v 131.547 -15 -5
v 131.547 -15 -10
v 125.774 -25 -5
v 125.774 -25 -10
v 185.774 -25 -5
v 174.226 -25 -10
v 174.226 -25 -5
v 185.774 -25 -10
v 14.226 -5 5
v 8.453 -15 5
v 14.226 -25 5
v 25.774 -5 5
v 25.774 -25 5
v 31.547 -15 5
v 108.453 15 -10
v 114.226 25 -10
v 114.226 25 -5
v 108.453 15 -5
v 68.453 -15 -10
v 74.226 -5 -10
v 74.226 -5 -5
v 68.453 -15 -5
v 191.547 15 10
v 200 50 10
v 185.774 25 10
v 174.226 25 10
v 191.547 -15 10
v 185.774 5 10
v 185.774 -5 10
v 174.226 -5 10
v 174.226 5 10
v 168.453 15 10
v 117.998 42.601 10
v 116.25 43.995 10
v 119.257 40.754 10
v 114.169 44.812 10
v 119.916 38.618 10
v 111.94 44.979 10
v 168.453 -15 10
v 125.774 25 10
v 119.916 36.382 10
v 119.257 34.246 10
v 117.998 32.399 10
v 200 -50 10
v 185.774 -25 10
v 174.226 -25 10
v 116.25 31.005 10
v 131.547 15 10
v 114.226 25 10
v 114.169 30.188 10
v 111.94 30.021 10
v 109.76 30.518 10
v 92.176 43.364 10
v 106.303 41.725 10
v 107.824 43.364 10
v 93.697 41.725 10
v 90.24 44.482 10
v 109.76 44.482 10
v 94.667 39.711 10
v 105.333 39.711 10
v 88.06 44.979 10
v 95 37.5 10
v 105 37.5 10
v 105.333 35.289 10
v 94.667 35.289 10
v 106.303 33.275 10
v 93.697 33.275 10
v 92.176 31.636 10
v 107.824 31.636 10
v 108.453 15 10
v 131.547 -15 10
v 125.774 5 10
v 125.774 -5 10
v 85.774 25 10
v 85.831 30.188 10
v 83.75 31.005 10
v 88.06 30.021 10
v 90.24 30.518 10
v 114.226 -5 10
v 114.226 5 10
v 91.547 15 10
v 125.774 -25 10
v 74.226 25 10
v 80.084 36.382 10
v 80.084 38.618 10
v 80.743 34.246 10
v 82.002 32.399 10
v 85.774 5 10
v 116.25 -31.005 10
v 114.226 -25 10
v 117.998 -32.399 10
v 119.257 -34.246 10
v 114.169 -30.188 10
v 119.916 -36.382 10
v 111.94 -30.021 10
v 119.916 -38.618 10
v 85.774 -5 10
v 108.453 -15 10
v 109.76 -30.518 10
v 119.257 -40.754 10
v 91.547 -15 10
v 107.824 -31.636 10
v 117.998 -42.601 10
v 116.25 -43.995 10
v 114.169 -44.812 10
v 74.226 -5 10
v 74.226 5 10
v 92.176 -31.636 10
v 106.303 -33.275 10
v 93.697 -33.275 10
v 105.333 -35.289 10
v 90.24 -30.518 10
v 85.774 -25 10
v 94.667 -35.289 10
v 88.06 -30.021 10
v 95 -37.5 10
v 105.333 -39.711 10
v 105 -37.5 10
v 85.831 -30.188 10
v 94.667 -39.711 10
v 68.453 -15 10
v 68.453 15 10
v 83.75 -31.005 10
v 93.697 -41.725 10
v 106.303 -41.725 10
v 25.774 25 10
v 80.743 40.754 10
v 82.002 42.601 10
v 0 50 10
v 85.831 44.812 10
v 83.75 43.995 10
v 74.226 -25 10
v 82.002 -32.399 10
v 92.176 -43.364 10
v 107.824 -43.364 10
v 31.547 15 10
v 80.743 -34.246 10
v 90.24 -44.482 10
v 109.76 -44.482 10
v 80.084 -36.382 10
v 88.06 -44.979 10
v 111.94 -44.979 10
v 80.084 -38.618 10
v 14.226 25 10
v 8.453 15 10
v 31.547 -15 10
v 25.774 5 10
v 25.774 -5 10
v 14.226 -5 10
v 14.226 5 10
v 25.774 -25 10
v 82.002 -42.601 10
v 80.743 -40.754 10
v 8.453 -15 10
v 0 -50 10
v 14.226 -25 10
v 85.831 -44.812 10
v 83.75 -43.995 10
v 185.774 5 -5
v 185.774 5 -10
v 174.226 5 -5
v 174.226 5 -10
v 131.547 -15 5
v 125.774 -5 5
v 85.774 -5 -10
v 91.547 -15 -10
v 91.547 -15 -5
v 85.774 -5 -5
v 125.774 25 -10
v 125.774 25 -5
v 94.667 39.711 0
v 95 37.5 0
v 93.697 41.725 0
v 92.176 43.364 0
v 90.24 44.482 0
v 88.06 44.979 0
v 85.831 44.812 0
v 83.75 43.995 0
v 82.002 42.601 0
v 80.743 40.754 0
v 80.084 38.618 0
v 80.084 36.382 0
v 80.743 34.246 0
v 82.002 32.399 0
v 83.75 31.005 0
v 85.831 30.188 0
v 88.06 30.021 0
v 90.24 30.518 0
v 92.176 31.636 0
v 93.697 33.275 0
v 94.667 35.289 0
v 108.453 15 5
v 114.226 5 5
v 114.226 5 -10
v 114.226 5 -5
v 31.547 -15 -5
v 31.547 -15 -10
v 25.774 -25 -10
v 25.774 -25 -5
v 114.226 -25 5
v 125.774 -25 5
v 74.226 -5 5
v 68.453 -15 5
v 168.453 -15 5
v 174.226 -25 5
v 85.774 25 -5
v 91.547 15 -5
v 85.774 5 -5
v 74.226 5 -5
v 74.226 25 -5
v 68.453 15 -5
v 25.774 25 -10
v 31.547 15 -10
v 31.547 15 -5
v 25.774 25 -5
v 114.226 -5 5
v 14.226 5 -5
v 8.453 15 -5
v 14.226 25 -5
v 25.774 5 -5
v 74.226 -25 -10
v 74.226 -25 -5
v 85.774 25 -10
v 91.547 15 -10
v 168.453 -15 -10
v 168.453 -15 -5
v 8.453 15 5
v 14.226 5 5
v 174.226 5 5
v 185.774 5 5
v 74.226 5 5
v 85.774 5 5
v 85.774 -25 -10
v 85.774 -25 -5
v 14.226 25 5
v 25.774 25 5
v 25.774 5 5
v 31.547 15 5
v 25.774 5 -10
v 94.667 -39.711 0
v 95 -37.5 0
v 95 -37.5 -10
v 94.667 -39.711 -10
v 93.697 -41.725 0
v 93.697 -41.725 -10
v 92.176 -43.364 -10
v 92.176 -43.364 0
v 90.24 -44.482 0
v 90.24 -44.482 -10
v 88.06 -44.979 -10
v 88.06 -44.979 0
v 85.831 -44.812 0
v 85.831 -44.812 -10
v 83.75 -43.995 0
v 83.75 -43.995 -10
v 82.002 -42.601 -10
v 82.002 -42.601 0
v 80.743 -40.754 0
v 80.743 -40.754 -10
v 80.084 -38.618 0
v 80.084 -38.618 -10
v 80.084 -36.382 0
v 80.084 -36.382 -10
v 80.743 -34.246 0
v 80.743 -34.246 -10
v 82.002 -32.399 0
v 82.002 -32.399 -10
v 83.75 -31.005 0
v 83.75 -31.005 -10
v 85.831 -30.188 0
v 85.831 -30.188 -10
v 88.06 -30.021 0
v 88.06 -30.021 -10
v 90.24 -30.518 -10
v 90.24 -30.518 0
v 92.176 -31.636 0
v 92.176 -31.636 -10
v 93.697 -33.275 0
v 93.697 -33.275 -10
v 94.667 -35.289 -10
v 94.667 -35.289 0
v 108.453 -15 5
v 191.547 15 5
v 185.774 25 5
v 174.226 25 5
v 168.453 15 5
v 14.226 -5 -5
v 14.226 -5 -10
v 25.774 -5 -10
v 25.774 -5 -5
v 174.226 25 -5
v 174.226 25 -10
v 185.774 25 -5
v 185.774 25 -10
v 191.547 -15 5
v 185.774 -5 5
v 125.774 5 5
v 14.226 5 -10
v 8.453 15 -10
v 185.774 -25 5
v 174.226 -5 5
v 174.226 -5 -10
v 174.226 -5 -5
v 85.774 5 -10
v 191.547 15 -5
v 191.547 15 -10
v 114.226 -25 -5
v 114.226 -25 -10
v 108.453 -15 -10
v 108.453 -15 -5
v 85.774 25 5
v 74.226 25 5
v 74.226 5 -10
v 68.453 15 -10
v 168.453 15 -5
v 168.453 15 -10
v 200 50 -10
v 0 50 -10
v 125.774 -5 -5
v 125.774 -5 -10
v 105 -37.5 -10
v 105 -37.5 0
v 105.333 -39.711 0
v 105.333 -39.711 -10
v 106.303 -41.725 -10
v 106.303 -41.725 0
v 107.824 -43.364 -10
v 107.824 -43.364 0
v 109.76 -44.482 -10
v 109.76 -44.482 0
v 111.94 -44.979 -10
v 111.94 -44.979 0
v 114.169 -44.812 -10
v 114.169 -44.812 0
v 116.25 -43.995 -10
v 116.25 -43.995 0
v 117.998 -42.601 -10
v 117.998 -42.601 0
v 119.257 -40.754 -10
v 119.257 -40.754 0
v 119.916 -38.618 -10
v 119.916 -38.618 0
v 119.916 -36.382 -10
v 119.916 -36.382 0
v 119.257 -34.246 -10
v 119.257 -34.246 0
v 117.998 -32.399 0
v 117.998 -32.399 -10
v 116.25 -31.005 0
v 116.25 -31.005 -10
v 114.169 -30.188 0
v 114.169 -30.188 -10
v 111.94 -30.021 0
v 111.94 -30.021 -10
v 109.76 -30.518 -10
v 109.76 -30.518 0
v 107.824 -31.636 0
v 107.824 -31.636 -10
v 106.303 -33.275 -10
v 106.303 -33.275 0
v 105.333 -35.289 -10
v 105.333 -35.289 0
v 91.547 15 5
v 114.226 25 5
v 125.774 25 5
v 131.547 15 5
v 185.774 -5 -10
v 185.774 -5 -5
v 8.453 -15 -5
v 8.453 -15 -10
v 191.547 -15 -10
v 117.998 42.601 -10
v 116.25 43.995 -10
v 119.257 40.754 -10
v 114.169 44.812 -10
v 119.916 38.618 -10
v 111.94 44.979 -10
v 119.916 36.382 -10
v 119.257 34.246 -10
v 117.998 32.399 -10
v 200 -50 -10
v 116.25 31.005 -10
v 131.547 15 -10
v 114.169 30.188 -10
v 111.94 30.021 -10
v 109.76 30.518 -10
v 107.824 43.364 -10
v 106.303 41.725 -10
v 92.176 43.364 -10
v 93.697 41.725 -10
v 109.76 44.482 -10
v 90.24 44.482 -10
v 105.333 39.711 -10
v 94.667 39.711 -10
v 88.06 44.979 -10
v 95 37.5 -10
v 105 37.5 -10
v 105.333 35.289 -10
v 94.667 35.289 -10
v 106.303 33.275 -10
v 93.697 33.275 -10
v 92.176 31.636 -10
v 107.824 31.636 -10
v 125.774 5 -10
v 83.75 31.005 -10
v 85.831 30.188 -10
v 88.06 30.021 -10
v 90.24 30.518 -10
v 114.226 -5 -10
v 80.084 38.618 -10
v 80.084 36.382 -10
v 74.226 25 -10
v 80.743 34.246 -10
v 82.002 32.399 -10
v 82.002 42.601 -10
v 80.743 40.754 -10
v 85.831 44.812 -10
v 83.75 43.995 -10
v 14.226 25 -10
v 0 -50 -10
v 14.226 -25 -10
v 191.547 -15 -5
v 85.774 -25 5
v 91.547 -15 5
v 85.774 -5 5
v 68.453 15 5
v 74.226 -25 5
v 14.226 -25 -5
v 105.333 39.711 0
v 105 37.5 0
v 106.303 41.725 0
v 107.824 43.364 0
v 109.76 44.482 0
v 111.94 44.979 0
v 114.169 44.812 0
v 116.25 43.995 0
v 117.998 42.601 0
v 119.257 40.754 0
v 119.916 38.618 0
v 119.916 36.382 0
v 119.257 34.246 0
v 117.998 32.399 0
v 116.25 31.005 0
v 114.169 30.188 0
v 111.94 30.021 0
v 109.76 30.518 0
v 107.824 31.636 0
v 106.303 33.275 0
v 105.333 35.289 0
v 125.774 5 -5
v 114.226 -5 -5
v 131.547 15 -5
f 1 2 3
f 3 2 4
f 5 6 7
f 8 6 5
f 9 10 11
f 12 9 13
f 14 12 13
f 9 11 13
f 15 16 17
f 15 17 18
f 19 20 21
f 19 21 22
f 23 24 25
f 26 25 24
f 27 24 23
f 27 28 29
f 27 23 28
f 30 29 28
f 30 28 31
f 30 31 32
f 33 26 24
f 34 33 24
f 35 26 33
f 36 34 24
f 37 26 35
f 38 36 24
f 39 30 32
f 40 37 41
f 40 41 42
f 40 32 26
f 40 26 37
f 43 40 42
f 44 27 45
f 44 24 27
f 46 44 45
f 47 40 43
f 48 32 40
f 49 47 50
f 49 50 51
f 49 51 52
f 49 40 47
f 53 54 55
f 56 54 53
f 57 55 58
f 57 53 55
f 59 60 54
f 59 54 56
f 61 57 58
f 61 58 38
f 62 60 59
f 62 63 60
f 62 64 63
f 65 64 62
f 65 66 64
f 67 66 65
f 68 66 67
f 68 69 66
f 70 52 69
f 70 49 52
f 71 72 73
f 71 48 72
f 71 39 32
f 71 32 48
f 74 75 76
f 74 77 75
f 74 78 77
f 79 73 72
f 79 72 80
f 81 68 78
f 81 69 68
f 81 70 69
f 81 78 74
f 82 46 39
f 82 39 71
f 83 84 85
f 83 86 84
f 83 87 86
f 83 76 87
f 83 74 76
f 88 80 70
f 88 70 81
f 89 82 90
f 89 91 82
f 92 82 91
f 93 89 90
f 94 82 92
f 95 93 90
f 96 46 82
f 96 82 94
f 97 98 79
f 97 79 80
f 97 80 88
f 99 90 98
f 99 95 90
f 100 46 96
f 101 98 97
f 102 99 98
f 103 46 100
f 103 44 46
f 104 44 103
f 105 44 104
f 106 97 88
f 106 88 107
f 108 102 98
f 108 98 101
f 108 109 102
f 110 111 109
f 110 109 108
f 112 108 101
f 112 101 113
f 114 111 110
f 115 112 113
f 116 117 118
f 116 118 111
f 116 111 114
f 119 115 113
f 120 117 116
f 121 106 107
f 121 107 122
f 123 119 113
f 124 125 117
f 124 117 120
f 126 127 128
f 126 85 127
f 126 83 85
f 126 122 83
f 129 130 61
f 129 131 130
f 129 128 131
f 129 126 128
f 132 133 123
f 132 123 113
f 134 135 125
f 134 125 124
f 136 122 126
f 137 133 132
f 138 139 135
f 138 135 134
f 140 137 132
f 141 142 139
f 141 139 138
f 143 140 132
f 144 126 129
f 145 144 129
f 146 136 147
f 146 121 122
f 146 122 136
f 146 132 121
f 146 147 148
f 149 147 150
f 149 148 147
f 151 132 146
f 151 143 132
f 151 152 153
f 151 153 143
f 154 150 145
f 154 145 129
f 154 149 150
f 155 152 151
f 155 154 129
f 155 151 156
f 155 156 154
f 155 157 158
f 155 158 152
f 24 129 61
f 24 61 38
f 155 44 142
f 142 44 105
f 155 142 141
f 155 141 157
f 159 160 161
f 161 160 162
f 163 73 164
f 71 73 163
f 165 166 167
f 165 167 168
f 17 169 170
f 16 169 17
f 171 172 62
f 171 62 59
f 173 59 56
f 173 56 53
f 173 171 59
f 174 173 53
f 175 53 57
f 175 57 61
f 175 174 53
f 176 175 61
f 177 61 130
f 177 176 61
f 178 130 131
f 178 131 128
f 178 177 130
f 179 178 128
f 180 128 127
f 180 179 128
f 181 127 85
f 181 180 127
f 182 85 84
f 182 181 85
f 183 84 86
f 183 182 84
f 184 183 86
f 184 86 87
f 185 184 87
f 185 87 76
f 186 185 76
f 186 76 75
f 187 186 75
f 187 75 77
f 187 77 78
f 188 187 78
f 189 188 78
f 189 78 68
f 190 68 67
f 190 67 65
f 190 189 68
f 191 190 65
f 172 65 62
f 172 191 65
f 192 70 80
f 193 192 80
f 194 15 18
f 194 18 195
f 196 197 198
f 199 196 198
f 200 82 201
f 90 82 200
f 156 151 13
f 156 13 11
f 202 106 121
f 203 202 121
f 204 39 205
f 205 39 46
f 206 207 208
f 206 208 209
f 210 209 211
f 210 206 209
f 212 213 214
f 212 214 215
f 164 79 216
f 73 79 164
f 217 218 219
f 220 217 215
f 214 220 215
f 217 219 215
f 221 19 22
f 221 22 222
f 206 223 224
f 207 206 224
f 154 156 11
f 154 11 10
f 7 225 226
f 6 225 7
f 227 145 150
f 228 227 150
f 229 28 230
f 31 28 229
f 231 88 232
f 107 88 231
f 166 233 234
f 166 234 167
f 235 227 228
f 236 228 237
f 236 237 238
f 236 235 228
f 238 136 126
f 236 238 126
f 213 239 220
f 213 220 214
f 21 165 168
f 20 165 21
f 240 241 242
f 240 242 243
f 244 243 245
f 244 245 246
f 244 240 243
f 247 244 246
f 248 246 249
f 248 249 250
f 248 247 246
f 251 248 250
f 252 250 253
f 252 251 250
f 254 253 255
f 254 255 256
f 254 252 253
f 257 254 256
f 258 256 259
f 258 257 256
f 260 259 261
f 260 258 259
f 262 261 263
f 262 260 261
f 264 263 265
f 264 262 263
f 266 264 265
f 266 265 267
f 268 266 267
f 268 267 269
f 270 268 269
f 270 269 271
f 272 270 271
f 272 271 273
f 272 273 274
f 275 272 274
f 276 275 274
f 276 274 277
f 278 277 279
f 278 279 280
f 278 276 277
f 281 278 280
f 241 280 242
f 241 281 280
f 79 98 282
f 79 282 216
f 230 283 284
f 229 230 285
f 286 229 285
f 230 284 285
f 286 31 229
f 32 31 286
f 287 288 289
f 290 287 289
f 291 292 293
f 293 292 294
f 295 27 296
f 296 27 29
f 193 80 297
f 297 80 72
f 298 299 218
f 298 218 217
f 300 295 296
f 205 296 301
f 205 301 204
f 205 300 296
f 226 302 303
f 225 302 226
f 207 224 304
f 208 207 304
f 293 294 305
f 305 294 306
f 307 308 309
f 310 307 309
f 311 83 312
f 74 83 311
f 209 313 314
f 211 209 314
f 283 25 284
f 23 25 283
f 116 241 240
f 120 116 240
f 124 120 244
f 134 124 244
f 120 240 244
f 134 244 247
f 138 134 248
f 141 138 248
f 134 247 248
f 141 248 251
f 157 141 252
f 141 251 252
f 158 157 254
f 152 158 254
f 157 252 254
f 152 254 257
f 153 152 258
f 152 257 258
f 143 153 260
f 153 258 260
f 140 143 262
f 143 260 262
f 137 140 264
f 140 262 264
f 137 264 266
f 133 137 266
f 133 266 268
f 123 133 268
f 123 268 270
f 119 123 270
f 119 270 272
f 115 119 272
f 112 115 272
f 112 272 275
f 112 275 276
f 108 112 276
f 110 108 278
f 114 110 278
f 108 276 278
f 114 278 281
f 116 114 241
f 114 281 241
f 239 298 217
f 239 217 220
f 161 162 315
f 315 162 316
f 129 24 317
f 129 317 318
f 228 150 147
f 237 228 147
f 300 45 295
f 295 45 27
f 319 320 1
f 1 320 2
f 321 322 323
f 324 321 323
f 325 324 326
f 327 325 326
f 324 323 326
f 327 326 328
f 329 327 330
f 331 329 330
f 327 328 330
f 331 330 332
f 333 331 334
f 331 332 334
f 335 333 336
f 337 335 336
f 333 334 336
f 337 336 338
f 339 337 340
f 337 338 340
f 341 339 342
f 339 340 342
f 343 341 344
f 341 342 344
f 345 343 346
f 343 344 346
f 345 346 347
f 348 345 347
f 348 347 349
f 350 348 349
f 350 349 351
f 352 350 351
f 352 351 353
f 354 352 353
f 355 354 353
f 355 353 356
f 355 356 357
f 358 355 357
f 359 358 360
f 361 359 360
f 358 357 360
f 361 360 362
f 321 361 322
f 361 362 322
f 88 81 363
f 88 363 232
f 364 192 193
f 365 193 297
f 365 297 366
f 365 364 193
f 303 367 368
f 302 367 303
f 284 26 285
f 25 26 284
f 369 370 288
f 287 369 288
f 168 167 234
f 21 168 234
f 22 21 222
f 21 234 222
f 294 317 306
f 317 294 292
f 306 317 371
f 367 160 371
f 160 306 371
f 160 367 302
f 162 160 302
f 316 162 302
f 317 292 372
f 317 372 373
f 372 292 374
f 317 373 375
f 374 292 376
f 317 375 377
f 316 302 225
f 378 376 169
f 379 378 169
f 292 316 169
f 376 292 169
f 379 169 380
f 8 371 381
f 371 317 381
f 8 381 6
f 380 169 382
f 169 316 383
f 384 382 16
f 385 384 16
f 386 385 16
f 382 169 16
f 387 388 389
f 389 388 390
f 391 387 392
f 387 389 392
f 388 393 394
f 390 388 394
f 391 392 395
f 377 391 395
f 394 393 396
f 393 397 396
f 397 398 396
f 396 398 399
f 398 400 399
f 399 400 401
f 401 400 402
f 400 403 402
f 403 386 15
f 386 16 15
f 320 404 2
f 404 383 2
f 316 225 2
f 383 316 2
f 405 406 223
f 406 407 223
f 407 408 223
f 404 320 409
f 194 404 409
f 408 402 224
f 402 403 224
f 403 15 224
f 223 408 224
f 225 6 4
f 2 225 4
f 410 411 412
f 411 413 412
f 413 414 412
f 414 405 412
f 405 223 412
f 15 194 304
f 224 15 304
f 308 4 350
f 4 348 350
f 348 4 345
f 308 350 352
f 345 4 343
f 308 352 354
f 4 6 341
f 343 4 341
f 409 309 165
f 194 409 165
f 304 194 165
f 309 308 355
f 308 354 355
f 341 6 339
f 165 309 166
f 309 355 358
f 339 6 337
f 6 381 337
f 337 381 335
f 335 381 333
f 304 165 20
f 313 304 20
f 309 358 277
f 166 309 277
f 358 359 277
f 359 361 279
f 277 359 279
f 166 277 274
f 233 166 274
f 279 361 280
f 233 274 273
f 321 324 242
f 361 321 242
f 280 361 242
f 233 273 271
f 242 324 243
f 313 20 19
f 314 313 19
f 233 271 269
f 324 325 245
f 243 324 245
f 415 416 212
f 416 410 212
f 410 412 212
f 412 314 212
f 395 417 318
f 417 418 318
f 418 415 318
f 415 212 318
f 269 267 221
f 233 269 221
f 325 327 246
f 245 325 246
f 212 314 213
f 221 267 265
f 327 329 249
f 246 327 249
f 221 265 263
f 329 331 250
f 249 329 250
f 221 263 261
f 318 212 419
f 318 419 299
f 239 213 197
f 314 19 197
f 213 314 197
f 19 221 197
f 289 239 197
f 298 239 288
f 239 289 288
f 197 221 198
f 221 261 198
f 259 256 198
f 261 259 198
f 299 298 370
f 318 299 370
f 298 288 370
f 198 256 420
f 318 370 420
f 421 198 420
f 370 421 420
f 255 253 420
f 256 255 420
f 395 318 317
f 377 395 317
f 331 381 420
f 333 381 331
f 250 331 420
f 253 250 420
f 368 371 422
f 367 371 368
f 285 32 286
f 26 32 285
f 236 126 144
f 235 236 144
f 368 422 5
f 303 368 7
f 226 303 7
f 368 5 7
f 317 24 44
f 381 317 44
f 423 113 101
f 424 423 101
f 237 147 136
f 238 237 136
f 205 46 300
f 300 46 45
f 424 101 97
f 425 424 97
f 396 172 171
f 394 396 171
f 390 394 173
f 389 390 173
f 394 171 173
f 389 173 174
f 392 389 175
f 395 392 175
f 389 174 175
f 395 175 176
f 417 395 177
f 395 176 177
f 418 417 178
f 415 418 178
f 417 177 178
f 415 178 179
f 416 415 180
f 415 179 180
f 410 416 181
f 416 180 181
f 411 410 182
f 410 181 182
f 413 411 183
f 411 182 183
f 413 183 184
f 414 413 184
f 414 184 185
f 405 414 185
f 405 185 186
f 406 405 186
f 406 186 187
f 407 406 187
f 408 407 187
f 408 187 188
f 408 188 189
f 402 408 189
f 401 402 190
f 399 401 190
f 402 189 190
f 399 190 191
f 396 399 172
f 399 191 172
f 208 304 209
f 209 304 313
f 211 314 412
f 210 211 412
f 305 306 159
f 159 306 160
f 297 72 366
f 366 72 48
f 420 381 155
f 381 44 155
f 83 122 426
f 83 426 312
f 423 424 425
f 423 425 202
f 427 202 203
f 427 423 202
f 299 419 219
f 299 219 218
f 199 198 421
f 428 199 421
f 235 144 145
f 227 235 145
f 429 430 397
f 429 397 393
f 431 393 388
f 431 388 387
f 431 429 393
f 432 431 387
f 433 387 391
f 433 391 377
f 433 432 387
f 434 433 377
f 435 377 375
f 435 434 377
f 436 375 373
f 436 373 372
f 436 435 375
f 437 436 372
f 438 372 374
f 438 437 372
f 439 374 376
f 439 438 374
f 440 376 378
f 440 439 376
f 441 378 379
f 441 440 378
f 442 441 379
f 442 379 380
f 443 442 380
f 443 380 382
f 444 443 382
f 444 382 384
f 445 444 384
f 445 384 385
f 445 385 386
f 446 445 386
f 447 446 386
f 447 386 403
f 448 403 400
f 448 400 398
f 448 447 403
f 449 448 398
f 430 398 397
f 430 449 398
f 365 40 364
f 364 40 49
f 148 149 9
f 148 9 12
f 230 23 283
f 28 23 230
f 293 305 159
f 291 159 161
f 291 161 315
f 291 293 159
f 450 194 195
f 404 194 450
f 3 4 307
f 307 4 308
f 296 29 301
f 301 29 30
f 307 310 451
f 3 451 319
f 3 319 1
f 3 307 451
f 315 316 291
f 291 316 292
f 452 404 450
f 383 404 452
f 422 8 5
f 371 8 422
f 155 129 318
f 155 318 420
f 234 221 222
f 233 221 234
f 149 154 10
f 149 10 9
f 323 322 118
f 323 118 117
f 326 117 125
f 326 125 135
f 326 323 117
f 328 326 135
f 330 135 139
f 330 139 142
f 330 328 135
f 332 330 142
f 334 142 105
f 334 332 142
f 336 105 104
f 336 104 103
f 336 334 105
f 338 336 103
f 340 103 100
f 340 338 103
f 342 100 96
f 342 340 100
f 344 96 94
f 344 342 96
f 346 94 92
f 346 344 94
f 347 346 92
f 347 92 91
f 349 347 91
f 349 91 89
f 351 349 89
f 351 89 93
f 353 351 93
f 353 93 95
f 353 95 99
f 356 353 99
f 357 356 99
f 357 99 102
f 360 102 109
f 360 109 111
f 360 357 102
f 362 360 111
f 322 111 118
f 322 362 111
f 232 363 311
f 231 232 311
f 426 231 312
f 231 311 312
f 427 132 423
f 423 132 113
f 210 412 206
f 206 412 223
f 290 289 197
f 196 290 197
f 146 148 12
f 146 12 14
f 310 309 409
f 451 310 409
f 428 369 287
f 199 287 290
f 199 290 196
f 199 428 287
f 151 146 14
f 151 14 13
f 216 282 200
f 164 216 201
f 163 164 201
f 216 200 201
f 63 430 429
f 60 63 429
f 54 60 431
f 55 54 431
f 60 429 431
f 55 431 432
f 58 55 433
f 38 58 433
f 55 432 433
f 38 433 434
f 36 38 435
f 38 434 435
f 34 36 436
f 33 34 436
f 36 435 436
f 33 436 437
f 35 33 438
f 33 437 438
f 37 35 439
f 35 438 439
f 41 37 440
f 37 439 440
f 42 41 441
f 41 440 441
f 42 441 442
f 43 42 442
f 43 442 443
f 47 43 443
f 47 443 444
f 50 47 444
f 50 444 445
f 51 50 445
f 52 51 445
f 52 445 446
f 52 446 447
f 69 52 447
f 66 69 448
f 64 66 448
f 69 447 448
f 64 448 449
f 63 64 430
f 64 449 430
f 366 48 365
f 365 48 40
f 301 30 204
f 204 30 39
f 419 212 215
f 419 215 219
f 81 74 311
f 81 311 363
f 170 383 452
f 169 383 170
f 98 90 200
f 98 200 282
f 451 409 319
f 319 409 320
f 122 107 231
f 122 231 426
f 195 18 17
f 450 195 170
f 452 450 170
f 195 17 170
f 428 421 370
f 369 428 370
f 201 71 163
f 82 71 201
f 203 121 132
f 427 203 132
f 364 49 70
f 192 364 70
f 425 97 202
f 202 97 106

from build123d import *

# Parameters (mm, degrees)
SKETCH1_W           = 100
SKETCH1_H           = 50
SKETCH1_R           = 7.5
BOSS_EXTRUDE1_DEPTH = 10
CUT_EXTRUDE1_DEPTH  = 5


with BuildPart() as part:
    # Sketch1 → Boss-Extrude1 (new body)
    with BuildSketch(Plane.XY):
        with Locations((50, 25)):
            Rectangle(SKETCH1_W, SKETCH1_H)
        with Locations((87.5, 37.5)):
            Circle(SKETCH1_R, mode=Mode.SUBTRACT)
    extrude(amount=BOSS_EXTRUDE1_DEPTH)

    # Sketch2 → Cut-Extrude1 (cut)
    with BuildSketch(Plane.XY.offset(10)):
        Polygon((25.773502692, 25), (14.226497308, 25), (8.452994616, 15), (14.226497308, 5), (25.773502692, 5), (31.547005384, 15), align=None)
    cut_extrude1 = extrude(amount=-CUT_EXTRUDE1_DEPTH, mode=Mode.SUBTRACT)

    # Mirror1: Cut-Extrude1 across plane
    add(cut_extrude1.mirror(Plane.ZY.offset(-50)), mode=Mode.SUBTRACT)

    # Mirror3: part across plane


with BuildPart() as part_1:
    add(part.part)
    add(part.part.mirror(Plane(origin=(0, 0, 10), x_dir=(0, 0, 1), z_dir=(0, 1, 0))))

    # Mirror4: part across plane


with BuildPart() as part_2:
    add(part_1.part)
    add(part_1.part.mirror(Plane(origin=(100, 0, 10), x_dir=(0, 0, 1), z_dir=(-1, 0, 0))))

    # Mirror5: part across plane


with BuildPart() as part_3:
    add(part_2.part)
    add(part_2.part.mirror(Plane(origin=(0, 0, 0), x_dir=(1, 0, 0), z_dir=(0, 0, -1))))


solid = part_3.part
